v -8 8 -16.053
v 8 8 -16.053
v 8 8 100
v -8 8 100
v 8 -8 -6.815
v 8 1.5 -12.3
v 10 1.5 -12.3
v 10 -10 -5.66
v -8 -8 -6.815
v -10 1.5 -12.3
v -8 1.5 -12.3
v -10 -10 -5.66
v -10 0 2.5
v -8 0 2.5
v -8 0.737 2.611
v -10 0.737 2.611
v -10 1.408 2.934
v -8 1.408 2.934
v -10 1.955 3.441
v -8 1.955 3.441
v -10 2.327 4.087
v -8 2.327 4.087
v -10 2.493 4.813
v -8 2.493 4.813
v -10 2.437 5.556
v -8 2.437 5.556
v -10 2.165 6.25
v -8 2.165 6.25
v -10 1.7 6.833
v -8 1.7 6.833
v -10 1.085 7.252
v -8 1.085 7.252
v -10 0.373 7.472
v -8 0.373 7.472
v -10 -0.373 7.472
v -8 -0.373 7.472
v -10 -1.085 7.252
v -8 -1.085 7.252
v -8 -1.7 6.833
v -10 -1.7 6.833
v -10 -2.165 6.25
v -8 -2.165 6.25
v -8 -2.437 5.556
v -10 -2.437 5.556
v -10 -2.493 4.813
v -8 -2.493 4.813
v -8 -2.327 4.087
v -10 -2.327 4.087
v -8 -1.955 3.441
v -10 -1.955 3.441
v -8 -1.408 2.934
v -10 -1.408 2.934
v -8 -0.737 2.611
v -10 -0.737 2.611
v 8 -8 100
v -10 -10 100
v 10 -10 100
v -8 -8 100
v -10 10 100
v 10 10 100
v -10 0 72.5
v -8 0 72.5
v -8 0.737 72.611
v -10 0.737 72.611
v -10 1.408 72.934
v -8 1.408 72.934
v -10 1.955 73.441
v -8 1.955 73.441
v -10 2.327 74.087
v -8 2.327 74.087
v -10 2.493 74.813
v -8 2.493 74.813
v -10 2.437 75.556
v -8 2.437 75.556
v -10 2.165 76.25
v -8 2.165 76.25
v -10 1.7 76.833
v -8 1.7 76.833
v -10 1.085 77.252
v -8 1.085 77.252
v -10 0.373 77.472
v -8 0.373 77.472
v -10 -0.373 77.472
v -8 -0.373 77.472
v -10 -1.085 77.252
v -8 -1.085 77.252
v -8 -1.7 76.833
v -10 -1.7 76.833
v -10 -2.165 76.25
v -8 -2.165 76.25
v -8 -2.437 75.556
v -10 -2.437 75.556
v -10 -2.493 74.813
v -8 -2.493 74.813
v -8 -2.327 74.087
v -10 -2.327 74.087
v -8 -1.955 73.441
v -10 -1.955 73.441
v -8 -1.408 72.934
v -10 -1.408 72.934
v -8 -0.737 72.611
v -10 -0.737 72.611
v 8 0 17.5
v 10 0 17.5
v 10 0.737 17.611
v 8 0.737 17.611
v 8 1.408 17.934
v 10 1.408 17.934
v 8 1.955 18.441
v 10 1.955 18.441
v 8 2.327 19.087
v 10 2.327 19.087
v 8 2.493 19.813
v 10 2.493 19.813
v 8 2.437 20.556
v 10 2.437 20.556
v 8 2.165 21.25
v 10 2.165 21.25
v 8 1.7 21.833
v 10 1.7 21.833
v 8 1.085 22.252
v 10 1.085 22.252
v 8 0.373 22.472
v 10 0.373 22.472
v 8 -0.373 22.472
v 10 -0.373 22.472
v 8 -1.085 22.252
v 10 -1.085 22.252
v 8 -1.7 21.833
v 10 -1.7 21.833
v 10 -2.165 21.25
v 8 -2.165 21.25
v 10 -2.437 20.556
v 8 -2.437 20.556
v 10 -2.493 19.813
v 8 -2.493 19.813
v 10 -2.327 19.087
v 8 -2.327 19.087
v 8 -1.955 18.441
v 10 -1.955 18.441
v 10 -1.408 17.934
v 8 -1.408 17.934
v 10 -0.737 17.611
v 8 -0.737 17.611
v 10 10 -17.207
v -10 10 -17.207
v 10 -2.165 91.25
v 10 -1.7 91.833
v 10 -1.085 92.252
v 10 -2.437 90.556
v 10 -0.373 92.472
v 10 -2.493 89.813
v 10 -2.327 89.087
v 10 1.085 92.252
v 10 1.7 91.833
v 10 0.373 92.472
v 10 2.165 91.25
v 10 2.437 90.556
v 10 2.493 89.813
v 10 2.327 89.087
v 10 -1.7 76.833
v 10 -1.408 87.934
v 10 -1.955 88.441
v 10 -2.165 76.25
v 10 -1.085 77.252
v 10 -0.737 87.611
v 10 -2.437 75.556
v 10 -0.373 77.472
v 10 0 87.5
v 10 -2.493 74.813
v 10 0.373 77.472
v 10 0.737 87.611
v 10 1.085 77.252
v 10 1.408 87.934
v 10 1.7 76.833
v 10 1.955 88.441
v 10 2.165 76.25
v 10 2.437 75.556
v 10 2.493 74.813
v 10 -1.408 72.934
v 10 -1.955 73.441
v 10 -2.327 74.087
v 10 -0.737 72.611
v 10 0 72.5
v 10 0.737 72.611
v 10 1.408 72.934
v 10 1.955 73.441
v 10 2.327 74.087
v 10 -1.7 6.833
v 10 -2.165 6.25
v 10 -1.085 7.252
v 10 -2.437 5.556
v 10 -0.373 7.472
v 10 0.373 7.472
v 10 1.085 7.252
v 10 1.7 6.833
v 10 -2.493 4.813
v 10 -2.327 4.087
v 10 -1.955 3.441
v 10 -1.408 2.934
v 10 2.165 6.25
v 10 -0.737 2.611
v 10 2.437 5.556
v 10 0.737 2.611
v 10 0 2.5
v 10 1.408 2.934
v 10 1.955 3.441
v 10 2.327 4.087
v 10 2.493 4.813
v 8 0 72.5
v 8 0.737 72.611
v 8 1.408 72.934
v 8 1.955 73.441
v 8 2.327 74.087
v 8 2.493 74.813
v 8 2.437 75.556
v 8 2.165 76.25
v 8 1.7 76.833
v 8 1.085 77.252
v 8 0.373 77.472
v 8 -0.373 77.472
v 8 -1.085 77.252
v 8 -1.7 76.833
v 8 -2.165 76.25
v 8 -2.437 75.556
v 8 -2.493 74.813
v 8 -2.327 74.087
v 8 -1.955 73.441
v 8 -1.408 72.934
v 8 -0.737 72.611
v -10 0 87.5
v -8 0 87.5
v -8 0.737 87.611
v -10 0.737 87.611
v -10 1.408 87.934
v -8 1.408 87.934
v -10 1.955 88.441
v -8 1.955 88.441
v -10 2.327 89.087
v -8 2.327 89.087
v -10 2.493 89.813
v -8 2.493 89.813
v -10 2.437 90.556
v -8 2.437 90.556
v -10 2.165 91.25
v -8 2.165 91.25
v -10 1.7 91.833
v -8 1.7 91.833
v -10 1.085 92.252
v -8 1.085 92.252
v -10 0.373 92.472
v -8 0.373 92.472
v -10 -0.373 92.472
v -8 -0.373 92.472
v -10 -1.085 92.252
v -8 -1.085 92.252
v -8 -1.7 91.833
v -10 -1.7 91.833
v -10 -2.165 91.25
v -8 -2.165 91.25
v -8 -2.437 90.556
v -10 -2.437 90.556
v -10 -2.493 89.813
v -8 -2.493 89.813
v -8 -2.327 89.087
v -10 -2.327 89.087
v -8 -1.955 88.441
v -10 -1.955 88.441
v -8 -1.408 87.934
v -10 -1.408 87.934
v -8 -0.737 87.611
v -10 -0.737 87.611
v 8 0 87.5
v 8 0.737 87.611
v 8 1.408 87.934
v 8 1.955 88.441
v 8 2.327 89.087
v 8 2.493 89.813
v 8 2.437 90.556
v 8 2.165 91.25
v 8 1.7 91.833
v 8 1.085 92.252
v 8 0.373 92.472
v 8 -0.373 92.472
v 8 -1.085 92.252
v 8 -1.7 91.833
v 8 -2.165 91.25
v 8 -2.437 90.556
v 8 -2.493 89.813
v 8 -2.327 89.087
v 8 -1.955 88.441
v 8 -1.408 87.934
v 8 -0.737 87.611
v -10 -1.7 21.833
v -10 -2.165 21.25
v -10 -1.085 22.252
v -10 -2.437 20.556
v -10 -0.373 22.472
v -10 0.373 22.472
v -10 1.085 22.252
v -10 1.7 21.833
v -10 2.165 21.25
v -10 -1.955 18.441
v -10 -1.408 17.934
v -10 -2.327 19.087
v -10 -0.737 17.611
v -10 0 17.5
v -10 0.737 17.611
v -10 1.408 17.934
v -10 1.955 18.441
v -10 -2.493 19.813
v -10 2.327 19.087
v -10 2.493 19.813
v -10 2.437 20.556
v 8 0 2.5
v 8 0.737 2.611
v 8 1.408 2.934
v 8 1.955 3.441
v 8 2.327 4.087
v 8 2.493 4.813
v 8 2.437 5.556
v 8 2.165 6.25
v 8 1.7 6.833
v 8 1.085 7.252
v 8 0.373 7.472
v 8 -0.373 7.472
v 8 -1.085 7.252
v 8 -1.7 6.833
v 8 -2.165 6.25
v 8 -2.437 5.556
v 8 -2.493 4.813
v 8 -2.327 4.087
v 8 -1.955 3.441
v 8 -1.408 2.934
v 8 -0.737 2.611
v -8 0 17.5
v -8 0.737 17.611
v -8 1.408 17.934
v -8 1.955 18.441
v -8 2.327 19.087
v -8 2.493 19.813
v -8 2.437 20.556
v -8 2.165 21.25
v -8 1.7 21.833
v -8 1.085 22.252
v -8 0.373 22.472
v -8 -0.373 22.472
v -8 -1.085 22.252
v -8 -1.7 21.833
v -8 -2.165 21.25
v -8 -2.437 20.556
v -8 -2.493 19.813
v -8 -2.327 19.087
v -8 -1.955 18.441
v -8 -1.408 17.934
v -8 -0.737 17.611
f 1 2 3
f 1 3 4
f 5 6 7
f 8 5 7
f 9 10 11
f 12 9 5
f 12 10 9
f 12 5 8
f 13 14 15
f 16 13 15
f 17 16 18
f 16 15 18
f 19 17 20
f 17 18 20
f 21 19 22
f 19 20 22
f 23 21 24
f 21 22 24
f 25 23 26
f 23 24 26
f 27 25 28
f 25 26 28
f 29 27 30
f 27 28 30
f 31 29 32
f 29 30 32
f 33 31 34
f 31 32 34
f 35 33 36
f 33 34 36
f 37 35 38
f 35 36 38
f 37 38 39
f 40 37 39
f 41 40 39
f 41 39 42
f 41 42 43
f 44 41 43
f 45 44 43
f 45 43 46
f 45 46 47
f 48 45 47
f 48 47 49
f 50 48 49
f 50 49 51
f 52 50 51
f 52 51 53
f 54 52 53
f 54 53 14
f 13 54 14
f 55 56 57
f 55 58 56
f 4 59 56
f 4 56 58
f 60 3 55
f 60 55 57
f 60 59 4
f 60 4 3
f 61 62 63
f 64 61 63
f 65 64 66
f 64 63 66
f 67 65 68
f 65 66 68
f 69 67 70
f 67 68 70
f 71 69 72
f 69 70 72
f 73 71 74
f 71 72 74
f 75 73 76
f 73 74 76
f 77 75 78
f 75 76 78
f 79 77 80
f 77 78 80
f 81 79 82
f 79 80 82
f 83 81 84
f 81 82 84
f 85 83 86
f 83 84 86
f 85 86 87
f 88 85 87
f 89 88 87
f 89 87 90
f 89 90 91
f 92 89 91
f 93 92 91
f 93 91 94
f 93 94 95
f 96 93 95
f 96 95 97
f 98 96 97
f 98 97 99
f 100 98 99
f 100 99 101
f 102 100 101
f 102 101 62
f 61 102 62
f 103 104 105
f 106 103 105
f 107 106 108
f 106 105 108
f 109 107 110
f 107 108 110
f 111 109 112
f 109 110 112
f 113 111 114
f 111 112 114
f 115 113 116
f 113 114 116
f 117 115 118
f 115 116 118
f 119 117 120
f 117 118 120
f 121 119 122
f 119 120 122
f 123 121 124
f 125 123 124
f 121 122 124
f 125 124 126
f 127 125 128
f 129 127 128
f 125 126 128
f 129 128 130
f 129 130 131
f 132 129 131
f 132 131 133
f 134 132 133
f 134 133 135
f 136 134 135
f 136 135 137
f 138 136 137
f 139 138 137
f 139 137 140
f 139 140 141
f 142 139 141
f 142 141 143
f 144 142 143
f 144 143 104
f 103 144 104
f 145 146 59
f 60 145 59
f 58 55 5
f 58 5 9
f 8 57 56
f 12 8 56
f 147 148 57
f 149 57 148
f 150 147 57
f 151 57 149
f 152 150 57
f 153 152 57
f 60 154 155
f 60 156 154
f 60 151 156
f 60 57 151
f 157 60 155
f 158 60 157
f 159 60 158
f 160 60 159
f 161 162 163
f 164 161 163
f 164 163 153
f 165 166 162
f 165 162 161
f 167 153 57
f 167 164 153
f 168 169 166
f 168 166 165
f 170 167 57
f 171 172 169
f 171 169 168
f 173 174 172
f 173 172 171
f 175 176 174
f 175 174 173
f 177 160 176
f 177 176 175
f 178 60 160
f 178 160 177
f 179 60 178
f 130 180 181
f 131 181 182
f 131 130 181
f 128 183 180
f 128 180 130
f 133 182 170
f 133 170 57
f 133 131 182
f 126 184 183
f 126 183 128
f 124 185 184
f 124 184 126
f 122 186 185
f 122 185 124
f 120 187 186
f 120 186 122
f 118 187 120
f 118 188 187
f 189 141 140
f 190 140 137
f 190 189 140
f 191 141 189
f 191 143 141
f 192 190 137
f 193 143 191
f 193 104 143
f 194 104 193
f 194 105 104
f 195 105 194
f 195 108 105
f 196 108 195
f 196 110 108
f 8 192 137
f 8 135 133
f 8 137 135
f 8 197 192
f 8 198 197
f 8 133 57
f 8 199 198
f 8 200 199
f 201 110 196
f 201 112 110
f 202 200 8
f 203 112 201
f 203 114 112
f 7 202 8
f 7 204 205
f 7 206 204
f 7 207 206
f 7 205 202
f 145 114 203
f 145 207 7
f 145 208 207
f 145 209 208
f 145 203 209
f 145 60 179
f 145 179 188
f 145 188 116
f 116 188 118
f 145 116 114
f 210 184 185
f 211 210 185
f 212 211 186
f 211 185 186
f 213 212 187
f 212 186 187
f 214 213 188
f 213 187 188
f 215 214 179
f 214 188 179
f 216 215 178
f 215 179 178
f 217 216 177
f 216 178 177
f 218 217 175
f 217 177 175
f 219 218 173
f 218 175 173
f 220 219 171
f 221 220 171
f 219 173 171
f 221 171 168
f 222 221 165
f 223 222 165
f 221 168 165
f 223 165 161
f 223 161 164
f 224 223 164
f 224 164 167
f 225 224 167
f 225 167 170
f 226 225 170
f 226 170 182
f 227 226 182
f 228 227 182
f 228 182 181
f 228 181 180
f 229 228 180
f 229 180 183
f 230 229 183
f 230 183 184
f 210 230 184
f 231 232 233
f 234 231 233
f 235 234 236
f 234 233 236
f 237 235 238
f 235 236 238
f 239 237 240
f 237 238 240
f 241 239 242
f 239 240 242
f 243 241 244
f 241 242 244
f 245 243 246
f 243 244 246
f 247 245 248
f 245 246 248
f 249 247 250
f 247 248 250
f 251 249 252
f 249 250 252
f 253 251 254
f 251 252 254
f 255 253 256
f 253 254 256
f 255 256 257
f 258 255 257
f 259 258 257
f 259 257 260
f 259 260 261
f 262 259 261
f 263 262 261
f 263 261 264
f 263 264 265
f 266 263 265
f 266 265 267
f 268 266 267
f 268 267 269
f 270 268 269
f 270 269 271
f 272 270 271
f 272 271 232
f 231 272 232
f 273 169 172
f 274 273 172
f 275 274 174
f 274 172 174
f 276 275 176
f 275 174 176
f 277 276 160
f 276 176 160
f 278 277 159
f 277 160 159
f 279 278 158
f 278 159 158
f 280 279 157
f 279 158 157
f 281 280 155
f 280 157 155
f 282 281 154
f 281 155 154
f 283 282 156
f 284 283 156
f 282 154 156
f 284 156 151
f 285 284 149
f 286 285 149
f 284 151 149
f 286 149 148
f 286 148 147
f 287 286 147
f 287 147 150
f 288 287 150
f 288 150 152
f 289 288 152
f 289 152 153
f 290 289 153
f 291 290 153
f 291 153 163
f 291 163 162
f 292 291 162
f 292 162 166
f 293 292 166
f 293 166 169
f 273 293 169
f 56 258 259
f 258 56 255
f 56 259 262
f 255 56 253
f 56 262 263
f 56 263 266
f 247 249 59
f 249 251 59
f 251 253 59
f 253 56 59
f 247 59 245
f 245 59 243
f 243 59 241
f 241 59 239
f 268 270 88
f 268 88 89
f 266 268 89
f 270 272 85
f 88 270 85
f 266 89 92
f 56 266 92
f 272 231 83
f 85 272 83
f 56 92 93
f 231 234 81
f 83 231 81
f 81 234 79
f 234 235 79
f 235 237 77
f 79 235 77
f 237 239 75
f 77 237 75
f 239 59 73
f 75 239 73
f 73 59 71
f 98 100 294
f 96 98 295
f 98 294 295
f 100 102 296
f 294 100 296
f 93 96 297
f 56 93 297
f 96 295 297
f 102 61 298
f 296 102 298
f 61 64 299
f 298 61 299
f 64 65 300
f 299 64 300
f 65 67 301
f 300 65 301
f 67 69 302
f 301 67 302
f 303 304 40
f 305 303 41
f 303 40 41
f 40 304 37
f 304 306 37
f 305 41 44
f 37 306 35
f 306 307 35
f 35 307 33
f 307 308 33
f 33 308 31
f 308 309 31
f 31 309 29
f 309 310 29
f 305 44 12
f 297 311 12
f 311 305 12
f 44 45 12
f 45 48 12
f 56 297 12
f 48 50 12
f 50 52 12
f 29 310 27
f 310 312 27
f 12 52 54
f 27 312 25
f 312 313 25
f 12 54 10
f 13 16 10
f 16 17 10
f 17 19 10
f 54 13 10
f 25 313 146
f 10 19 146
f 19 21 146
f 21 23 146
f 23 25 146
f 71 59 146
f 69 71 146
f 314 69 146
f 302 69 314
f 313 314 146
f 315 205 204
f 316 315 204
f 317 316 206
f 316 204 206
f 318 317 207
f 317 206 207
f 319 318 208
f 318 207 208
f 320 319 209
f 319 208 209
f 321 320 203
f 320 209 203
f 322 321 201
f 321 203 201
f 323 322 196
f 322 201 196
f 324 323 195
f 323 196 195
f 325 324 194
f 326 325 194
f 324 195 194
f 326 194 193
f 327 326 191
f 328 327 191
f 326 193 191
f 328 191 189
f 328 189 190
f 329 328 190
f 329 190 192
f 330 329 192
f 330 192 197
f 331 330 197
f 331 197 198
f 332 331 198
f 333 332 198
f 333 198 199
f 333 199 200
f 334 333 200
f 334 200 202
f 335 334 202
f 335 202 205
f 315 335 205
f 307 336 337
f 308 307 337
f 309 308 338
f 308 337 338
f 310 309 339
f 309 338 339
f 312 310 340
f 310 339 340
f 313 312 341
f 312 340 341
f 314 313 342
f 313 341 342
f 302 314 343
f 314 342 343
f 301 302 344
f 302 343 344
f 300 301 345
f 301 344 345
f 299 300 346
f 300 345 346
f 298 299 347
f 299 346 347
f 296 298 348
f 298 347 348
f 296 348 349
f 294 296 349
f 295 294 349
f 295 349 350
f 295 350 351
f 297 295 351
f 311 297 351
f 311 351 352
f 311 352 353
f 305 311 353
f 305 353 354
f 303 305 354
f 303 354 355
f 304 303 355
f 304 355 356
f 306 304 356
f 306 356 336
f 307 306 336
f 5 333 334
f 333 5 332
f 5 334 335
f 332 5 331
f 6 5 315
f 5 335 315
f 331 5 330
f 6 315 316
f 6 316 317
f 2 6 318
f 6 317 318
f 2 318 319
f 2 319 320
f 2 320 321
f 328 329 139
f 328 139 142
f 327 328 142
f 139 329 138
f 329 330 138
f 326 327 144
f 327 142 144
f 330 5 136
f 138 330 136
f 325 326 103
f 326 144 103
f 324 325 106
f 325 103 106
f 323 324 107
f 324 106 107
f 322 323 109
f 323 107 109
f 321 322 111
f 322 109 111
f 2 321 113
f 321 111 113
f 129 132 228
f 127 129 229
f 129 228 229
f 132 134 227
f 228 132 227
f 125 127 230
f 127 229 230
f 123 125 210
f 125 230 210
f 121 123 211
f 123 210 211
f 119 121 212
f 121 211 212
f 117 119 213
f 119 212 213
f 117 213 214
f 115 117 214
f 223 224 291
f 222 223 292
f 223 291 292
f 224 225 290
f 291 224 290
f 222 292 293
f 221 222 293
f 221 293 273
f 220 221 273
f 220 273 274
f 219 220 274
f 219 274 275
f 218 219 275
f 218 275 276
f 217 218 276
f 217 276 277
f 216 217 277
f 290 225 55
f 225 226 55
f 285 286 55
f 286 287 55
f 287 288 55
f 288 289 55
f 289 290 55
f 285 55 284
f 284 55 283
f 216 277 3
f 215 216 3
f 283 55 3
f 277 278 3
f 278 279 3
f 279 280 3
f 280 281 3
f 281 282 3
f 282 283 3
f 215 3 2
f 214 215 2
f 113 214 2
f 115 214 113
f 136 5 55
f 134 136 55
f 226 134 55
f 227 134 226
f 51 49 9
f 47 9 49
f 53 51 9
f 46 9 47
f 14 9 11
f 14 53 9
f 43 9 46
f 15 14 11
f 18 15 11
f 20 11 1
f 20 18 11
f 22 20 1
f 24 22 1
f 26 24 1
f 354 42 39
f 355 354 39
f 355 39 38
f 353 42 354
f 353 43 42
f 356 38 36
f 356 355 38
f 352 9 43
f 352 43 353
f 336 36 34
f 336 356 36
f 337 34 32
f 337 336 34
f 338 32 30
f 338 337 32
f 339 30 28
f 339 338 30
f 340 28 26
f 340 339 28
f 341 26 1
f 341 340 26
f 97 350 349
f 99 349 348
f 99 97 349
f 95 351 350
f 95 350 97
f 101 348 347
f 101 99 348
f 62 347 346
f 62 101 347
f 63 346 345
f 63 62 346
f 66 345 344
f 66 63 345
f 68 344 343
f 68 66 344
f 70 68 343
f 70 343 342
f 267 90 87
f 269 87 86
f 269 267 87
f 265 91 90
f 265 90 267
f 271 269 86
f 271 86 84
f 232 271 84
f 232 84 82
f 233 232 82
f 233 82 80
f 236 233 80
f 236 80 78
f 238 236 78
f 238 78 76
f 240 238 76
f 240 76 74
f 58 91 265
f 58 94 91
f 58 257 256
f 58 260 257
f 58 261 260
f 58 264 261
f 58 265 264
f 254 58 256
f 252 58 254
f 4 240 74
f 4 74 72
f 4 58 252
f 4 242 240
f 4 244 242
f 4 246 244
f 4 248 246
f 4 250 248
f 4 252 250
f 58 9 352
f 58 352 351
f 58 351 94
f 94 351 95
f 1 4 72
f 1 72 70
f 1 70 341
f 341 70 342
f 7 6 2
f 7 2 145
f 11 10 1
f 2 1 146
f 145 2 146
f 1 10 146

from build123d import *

# Parameters (mm, degrees)
SKETCH1_W           = 20
SKETCH1_H           = 20
SKETCH1_W_2         = 16
SKETCH1_H_2         = 16
BOSS_EXTRUDE1_DEPTH = 100
SKETCH4_R           = 2.5
CUT_EXTRUDE2_DEPTH  = 103.46950766
SKETCH5_W           = 20
SKETCH5_H           = 20
SKETCH5_W_2         = 16
SKETCH5_H_2         = 16
BOSS_EXTRUDE2_DEPTH = 12.3
BOSS_EXTRUDE3_DEPTH = 20
SKETCH7_W           = 16
SKETCH7_H           = 16
CUT_EXTRUDE3_DEPTH  = 114.186969215
CUT_EXTRUDE4_DEPTH  = 103.46950766


with BuildPart() as part:
    # Sketch1 → Boss-Extrude1 (new body)
    with BuildSketch(Plane.XY):
        Rectangle(SKETCH1_W, SKETCH1_H)
        Rectangle(SKETCH1_W_2, SKETCH1_H_2, mode=Mode.SUBTRACT)
    extrude(amount=BOSS_EXTRUDE1_DEPTH)

    # Sketch4 → Cut-Extrude2 (cut, through all)
    with BuildSketch(Plane(origin=(10, 0, 0), x_dir=(0, 0, -1), z_dir=(1, 0, 0))):
        with Locations((-90, 0)):
            Circle(SKETCH4_R)
        with Locations((-75, 0)):
            Circle(SKETCH4_R)
        with Locations((-5, 0)):
            Circle(SKETCH4_R)
        with Locations((-20, 0)):
            Circle(SKETCH4_R)
    extrude(amount=-CUT_EXTRUDE2_DEPTH, mode=Mode.SUBTRACT)

    # Sketch5 → Boss-Extrude2 (add)
    with BuildSketch(Plane(origin=(0, 0, 0), x_dir=(-1, 0, 0), z_dir=(0, 0, -1))):
        Rectangle(SKETCH5_W, SKETCH5_H)
        Rectangle(SKETCH5_W_2, SKETCH5_H_2, mode=Mode.SUBTRACT)
    extrude(amount=BOSS_EXTRUDE2_DEPTH)

    # Sketch6 → Boss-Extrude3 (add)
    with BuildSketch(Plane.ZY.offset(10)):
        Polygon((-12.3, 10), (-12.3, 1.5), (-17.207477288, 10), align=None)
    extrude(amount=-BOSS_EXTRUDE3_DEPTH)

    # Sketch7 → Cut-Extrude3 (cut, through all)
    with BuildSketch(Plane.XY.offset(-12.3)):
        Rectangle(SKETCH7_W, SKETCH7_H)
    extrude(amount=-CUT_EXTRUDE3_DEPTH, mode=Mode.SUBTRACT)

    # Sketch8 → Cut-Extrude4 (cut, through all)
    with BuildSketch(Plane.ZY.offset(10)):
        Polygon((-17.207477288, 10), (-5.660471904, -10), (-17.207477288, -10), align=None)
    extrude(amount=-CUT_EXTRUDE4_DEPTH, mode=Mode.SUBTRACT)


solid = part.part
